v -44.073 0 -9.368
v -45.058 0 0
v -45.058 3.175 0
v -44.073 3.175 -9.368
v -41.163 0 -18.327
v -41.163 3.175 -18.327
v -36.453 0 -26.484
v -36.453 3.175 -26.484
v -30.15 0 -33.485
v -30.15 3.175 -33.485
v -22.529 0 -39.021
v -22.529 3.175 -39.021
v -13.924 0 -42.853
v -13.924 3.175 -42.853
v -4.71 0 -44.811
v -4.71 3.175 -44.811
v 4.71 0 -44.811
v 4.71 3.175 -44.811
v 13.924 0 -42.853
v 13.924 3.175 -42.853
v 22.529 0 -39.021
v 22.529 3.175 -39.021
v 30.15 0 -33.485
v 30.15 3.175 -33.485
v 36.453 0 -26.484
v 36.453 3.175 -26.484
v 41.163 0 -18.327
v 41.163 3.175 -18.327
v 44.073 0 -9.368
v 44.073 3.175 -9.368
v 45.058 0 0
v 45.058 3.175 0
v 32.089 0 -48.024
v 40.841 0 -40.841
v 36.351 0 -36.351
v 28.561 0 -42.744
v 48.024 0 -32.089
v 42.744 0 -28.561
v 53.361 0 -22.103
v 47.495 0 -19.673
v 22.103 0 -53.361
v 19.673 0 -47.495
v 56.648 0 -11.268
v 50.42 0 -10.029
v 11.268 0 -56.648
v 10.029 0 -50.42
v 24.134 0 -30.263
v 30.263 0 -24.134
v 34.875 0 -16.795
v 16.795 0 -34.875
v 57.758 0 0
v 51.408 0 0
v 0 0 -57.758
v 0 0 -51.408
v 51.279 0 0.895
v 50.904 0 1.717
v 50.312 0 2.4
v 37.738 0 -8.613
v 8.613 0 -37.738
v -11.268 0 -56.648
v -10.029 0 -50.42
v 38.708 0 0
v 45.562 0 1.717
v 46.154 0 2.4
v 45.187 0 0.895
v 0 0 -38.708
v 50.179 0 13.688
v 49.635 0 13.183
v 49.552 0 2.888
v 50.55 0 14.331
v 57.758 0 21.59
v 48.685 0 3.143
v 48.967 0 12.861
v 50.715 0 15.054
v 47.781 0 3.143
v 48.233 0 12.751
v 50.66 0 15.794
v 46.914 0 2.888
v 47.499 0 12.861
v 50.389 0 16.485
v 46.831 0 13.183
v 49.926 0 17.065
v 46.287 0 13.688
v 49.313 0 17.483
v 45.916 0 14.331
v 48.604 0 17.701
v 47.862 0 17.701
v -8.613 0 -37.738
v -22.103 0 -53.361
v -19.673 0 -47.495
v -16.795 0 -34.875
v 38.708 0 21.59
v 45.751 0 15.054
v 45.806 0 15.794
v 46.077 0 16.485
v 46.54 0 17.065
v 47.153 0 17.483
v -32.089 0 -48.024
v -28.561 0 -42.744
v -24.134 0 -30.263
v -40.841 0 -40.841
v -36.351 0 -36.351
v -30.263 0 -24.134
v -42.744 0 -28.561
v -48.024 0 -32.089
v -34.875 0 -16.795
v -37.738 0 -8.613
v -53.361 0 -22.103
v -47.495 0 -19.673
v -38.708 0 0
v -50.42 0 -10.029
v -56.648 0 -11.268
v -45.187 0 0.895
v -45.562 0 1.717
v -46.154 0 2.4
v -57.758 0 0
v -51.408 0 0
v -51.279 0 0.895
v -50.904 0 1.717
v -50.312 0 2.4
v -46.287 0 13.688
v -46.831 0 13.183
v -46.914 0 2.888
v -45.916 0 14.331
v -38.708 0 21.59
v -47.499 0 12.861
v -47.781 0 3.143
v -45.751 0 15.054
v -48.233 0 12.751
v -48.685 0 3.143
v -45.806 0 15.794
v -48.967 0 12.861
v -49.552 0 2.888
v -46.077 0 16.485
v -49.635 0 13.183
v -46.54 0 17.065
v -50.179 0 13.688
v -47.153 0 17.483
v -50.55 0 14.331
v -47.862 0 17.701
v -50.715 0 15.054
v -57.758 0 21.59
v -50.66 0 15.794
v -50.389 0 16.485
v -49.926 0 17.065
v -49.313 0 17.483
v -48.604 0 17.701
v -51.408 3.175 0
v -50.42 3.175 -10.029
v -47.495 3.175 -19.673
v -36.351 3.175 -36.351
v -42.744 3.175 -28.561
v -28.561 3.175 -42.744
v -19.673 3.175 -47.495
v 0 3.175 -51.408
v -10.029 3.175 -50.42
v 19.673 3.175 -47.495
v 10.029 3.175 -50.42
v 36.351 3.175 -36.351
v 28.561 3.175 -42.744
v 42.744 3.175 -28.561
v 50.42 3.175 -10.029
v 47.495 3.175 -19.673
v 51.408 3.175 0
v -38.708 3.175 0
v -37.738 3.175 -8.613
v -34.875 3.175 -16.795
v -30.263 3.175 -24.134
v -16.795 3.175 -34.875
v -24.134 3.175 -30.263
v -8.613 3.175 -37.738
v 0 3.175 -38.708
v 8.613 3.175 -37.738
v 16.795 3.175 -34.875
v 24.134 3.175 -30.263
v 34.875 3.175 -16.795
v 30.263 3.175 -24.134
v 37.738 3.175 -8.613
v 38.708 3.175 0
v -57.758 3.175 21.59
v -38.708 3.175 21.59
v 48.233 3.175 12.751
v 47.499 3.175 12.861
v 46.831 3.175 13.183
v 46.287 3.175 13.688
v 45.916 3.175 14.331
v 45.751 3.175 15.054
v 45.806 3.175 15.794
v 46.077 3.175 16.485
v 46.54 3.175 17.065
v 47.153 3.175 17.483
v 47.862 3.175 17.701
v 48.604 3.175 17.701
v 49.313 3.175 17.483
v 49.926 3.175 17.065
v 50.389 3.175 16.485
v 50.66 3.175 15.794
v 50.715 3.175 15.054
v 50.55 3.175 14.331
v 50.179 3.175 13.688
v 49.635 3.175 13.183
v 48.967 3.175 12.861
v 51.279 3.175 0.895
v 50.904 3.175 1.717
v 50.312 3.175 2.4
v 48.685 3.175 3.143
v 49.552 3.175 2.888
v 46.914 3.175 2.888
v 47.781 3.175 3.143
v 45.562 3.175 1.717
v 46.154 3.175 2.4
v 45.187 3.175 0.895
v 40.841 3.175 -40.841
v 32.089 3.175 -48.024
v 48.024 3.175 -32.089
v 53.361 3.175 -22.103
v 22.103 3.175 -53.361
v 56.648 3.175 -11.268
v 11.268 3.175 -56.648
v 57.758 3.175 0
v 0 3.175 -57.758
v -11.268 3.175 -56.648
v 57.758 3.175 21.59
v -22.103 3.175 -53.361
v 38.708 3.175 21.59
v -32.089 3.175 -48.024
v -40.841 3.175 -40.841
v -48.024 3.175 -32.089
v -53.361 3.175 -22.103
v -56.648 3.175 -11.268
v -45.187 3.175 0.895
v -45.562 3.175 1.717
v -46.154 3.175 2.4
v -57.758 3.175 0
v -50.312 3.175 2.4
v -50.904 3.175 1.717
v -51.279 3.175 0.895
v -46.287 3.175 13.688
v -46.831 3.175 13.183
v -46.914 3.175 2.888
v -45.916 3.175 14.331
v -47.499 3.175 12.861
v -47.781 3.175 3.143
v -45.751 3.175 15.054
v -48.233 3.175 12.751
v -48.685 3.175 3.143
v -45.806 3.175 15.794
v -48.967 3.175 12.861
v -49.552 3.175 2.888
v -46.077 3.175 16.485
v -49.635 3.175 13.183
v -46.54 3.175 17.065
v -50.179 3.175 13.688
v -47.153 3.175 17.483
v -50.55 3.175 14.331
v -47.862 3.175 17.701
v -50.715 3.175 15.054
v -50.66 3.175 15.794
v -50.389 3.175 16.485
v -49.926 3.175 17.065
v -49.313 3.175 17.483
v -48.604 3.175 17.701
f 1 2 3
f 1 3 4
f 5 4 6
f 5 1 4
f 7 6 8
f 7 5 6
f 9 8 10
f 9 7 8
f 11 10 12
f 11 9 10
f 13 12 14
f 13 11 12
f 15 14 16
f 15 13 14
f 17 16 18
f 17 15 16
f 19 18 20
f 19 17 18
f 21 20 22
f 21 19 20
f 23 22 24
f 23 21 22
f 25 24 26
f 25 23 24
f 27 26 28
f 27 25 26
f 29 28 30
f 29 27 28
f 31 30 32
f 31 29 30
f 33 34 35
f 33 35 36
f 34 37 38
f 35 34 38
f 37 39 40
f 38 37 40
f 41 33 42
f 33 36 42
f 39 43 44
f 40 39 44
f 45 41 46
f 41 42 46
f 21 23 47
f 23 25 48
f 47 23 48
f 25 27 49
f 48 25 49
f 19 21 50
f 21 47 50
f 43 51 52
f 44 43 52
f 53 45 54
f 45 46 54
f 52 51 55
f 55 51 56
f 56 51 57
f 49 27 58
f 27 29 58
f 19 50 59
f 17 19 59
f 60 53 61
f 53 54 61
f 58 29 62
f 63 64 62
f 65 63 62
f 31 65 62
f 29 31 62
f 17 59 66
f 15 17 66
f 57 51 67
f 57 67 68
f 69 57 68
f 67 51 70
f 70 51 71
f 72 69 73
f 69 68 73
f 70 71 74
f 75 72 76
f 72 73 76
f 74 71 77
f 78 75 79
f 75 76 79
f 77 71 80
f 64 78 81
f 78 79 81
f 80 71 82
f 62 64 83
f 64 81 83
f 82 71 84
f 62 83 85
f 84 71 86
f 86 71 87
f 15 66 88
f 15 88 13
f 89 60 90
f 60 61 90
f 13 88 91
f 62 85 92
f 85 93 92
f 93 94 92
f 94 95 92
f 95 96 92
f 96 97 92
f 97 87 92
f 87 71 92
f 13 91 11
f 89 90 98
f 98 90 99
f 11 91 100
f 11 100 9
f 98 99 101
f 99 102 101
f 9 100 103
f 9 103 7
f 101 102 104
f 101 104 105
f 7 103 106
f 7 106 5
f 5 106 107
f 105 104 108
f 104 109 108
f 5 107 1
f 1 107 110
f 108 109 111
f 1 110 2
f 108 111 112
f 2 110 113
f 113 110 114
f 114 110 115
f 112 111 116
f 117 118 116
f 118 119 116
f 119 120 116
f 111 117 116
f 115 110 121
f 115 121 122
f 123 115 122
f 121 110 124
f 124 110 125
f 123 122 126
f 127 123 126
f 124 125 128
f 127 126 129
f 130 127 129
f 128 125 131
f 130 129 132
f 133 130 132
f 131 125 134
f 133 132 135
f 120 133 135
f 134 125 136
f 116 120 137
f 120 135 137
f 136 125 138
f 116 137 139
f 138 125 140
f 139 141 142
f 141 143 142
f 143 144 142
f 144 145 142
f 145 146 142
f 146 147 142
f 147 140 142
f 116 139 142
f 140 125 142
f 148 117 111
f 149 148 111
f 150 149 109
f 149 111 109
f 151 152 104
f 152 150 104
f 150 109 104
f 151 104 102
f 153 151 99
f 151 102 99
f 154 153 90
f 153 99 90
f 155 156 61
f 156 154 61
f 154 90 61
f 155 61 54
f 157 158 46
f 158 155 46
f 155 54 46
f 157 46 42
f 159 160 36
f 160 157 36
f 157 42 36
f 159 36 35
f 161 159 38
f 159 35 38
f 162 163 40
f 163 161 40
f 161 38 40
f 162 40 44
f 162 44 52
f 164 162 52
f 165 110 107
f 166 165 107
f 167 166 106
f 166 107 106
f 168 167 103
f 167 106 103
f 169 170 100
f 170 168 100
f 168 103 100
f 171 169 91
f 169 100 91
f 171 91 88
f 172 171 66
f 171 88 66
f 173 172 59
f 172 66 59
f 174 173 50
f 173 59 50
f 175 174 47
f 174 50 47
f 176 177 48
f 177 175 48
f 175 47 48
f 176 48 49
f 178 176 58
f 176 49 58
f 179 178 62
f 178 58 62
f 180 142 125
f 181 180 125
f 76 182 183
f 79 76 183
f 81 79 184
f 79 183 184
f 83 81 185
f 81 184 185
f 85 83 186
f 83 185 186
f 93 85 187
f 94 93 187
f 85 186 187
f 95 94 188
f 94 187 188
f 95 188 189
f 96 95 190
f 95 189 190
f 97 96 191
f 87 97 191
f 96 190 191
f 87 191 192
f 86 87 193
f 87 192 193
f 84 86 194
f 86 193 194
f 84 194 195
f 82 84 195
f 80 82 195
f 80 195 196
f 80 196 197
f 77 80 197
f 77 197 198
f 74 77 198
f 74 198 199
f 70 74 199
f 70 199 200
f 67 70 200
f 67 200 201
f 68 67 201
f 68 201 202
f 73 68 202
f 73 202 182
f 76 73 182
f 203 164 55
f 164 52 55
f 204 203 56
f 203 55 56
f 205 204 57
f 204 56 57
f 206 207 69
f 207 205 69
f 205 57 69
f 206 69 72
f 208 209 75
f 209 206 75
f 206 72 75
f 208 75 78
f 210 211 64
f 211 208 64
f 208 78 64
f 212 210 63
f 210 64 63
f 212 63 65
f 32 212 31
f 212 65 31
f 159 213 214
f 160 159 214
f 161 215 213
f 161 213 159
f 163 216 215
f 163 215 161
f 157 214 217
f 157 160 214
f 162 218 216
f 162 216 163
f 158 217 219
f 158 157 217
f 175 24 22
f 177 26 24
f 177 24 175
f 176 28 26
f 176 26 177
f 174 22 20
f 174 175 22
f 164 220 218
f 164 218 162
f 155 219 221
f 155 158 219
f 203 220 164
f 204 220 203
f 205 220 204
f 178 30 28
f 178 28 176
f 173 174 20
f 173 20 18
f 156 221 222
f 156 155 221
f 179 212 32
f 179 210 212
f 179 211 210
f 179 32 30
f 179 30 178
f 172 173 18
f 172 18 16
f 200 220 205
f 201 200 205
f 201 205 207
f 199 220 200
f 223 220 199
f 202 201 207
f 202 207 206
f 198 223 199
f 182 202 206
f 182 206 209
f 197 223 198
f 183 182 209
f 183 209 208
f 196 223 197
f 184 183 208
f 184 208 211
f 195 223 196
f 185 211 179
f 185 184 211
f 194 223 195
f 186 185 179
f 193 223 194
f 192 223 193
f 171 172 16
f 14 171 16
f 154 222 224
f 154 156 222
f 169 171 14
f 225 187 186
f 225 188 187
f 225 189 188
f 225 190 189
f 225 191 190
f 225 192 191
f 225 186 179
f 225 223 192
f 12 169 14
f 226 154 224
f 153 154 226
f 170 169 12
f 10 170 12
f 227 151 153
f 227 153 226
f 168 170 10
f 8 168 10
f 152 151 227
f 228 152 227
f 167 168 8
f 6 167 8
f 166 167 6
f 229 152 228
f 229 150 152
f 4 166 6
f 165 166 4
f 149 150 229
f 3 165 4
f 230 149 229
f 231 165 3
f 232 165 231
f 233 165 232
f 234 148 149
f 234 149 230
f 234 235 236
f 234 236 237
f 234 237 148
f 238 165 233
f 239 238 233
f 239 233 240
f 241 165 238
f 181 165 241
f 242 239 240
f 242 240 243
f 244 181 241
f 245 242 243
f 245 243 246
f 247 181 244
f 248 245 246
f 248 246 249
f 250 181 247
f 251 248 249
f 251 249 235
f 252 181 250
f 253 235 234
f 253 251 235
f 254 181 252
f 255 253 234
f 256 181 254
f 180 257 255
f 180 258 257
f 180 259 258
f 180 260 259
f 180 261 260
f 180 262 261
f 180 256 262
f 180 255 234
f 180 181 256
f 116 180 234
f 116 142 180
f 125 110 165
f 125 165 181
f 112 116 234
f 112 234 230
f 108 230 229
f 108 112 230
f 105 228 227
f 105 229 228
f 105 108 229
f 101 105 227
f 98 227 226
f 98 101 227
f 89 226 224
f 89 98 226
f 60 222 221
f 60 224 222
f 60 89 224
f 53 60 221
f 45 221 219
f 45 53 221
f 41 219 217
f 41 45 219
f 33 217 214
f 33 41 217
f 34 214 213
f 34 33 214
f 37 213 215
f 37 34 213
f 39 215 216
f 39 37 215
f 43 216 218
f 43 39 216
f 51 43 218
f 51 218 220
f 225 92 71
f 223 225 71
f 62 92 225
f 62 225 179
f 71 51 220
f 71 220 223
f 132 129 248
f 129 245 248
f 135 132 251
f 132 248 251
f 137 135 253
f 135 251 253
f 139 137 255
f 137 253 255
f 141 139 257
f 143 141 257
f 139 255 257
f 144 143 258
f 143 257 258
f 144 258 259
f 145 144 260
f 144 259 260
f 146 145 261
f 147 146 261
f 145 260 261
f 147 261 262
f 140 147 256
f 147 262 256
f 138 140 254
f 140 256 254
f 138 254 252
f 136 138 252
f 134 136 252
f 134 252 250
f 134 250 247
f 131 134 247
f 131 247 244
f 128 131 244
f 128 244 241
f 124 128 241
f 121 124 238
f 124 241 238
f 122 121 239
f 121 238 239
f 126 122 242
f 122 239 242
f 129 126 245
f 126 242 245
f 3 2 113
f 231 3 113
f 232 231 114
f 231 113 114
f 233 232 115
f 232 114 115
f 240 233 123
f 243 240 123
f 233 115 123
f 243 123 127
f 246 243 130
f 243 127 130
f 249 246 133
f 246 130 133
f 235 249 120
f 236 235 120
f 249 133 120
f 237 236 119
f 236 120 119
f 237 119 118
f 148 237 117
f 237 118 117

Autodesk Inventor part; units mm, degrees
ref_plane "YZ Plane" through (0, 0, 0) normal (1, 0, 0) x (0, 1, 0)
ref_plane "XZ Plane" through (0, 0, 0) normal (0, 1, 0) x (-1, 0, 0)
ref_plane "XY Plane" through (0, 0, 0) normal (0, 0, 1) x (1, 0, 0)
sketch "Sketch1" plane through (0, 0, 0) normal (0, 1, 0) x (-1, 0, 0)
  arc A0 (-48.1285, 3.1733) -> (48.1285, 3.1733) centre (0, 0) ccw
  arc A1 (-45.058, 0) -> (45.058, 0) centre (0, 0) ccw
  arc A2 (-38.708, 0) -> (38.708, 0) centre (0, 0) ccw
  arc A3 (-51.408, 0) -> (51.408, 0) centre (0, 0) ccw
  arc A4 (-57.758, 0) -> (57.758, 0) centre (0, 0) ccw
  circle A5 centre (48.233, 0) radius 3.175
  line L0 (0, 0) -> (48.233, 0)
  line L1 (0, 0) -> (-48.233, 0)
  circle A6 centre (-48.233, 0) radius 3.175
  line L2 (-48.233, 0) -> (-48.233, 15.24)
  line L3 (-38.708, 0) -> (-38.708, 15.24)
  line L4 (-57.758, 0) -> (-57.758, 15.24)
  line L5 (48.233, 0) -> (48.233, 15.24)
  line L6 (38.708, 0) -> (38.708, 15.24)
  line L7 (57.758, 0) -> (57.758, 15.24)
  line L8 (-38.708, 21.59) -> (-57.758, 21.59)
  line L9 (-57.758, 21.59) -> (-57.758, 15.24)
  line L10 (-38.708, 21.59) -> (-38.708, 15.24)
  line L11 (57.758, 21.59) -> (38.708, 21.59)
  line L12 (38.708, 21.59) -> (38.708, 15.24)
  line L13 (57.758, 21.59) -> (57.758, 15.24)
  point P0 (-48.233, 15.24)
  point P1 (45.058, 0)
  dimension "d0" = 96.4661
  dimension "d1" = 3.175
  dimension "d2" = 6.35
  dimension "d3" = 3.175
  dimension "d4" = 6.35
  dimension "d5" = 6.35
  dimension "d6" = 6.35
  dimension "d7" = 15.24
  dimension "d8" = 15.24
  dimension "d18" = 6.35
  dimension "d19" = 6.35
extrude "Extrusion1" add sketch "Sketch1" along normal blind 3.175 contours A6 A3 A5 L0 L6 L12 L11 L13 L7 A4 L4 L9 L8 L10 L3 L1 | L1 A2 L0 A1
hole "Hole1" at (48.233, 0, 15.24) at (-48.233, 0, 15.24) direction (0, 1, 0) diameter 4.9784 end through all clearance for "Flat Head Machine Screw (82)" size "#10" standard "Ansi Unified Screw Threads"
equation "\"d0\" = ringDiam"
equation "\"d7\" = thickness + stageSpace"
equation "\"d8\" = thickness + stageSpace"
equation "\"height\" = 203.2"
equation "\"thickness\" = 12.7"
equation "\"shaftDiam\" = 6.35"
equation "\"shaftSpace\" = 1.5875"
equation "\"stageSpace\" = 2.54"
equation "\"stageAngle\" = 15deg"
equation "\"bearingDiam\" = 9.5504"
equation "\"FlangeDiam\" = 12.7"
equation "\"FlangeDepth\" = 1.5875"
equation "\"smallFilet\" = 0.39687"
equation "\"ringDiam\" = 96.46608"
equation "\"stockHeight\" = 50.8"
equation "\"stockWidth\" = 76.2"
equation "\"stockRad\" = 9.525"
equation "\"stockGuage\" = 3.175"
equation "\"groundActu\" = 304.8"
equation "\"baseWidth\" = 1066.8"
equation "\"baseDepth\" = 254"
equation "\"capThickness\" = 3.175"
equation "\"sup1Len\" = 660.4"
equation "\"sup1Ang\" = 22.619865deg"
equation "\"sup2Len\" = 2079.37366"
equation "\"sup2Ang\" = 8.959949deg"
equation "\"supVertLen\" = 955.13561"
equation "\"supSideLen\" = 1531.12879"
equation "\"supSideAng\" = 19.376933deg"
properties part number "lock ring 1" material "Aluminum 6061"
